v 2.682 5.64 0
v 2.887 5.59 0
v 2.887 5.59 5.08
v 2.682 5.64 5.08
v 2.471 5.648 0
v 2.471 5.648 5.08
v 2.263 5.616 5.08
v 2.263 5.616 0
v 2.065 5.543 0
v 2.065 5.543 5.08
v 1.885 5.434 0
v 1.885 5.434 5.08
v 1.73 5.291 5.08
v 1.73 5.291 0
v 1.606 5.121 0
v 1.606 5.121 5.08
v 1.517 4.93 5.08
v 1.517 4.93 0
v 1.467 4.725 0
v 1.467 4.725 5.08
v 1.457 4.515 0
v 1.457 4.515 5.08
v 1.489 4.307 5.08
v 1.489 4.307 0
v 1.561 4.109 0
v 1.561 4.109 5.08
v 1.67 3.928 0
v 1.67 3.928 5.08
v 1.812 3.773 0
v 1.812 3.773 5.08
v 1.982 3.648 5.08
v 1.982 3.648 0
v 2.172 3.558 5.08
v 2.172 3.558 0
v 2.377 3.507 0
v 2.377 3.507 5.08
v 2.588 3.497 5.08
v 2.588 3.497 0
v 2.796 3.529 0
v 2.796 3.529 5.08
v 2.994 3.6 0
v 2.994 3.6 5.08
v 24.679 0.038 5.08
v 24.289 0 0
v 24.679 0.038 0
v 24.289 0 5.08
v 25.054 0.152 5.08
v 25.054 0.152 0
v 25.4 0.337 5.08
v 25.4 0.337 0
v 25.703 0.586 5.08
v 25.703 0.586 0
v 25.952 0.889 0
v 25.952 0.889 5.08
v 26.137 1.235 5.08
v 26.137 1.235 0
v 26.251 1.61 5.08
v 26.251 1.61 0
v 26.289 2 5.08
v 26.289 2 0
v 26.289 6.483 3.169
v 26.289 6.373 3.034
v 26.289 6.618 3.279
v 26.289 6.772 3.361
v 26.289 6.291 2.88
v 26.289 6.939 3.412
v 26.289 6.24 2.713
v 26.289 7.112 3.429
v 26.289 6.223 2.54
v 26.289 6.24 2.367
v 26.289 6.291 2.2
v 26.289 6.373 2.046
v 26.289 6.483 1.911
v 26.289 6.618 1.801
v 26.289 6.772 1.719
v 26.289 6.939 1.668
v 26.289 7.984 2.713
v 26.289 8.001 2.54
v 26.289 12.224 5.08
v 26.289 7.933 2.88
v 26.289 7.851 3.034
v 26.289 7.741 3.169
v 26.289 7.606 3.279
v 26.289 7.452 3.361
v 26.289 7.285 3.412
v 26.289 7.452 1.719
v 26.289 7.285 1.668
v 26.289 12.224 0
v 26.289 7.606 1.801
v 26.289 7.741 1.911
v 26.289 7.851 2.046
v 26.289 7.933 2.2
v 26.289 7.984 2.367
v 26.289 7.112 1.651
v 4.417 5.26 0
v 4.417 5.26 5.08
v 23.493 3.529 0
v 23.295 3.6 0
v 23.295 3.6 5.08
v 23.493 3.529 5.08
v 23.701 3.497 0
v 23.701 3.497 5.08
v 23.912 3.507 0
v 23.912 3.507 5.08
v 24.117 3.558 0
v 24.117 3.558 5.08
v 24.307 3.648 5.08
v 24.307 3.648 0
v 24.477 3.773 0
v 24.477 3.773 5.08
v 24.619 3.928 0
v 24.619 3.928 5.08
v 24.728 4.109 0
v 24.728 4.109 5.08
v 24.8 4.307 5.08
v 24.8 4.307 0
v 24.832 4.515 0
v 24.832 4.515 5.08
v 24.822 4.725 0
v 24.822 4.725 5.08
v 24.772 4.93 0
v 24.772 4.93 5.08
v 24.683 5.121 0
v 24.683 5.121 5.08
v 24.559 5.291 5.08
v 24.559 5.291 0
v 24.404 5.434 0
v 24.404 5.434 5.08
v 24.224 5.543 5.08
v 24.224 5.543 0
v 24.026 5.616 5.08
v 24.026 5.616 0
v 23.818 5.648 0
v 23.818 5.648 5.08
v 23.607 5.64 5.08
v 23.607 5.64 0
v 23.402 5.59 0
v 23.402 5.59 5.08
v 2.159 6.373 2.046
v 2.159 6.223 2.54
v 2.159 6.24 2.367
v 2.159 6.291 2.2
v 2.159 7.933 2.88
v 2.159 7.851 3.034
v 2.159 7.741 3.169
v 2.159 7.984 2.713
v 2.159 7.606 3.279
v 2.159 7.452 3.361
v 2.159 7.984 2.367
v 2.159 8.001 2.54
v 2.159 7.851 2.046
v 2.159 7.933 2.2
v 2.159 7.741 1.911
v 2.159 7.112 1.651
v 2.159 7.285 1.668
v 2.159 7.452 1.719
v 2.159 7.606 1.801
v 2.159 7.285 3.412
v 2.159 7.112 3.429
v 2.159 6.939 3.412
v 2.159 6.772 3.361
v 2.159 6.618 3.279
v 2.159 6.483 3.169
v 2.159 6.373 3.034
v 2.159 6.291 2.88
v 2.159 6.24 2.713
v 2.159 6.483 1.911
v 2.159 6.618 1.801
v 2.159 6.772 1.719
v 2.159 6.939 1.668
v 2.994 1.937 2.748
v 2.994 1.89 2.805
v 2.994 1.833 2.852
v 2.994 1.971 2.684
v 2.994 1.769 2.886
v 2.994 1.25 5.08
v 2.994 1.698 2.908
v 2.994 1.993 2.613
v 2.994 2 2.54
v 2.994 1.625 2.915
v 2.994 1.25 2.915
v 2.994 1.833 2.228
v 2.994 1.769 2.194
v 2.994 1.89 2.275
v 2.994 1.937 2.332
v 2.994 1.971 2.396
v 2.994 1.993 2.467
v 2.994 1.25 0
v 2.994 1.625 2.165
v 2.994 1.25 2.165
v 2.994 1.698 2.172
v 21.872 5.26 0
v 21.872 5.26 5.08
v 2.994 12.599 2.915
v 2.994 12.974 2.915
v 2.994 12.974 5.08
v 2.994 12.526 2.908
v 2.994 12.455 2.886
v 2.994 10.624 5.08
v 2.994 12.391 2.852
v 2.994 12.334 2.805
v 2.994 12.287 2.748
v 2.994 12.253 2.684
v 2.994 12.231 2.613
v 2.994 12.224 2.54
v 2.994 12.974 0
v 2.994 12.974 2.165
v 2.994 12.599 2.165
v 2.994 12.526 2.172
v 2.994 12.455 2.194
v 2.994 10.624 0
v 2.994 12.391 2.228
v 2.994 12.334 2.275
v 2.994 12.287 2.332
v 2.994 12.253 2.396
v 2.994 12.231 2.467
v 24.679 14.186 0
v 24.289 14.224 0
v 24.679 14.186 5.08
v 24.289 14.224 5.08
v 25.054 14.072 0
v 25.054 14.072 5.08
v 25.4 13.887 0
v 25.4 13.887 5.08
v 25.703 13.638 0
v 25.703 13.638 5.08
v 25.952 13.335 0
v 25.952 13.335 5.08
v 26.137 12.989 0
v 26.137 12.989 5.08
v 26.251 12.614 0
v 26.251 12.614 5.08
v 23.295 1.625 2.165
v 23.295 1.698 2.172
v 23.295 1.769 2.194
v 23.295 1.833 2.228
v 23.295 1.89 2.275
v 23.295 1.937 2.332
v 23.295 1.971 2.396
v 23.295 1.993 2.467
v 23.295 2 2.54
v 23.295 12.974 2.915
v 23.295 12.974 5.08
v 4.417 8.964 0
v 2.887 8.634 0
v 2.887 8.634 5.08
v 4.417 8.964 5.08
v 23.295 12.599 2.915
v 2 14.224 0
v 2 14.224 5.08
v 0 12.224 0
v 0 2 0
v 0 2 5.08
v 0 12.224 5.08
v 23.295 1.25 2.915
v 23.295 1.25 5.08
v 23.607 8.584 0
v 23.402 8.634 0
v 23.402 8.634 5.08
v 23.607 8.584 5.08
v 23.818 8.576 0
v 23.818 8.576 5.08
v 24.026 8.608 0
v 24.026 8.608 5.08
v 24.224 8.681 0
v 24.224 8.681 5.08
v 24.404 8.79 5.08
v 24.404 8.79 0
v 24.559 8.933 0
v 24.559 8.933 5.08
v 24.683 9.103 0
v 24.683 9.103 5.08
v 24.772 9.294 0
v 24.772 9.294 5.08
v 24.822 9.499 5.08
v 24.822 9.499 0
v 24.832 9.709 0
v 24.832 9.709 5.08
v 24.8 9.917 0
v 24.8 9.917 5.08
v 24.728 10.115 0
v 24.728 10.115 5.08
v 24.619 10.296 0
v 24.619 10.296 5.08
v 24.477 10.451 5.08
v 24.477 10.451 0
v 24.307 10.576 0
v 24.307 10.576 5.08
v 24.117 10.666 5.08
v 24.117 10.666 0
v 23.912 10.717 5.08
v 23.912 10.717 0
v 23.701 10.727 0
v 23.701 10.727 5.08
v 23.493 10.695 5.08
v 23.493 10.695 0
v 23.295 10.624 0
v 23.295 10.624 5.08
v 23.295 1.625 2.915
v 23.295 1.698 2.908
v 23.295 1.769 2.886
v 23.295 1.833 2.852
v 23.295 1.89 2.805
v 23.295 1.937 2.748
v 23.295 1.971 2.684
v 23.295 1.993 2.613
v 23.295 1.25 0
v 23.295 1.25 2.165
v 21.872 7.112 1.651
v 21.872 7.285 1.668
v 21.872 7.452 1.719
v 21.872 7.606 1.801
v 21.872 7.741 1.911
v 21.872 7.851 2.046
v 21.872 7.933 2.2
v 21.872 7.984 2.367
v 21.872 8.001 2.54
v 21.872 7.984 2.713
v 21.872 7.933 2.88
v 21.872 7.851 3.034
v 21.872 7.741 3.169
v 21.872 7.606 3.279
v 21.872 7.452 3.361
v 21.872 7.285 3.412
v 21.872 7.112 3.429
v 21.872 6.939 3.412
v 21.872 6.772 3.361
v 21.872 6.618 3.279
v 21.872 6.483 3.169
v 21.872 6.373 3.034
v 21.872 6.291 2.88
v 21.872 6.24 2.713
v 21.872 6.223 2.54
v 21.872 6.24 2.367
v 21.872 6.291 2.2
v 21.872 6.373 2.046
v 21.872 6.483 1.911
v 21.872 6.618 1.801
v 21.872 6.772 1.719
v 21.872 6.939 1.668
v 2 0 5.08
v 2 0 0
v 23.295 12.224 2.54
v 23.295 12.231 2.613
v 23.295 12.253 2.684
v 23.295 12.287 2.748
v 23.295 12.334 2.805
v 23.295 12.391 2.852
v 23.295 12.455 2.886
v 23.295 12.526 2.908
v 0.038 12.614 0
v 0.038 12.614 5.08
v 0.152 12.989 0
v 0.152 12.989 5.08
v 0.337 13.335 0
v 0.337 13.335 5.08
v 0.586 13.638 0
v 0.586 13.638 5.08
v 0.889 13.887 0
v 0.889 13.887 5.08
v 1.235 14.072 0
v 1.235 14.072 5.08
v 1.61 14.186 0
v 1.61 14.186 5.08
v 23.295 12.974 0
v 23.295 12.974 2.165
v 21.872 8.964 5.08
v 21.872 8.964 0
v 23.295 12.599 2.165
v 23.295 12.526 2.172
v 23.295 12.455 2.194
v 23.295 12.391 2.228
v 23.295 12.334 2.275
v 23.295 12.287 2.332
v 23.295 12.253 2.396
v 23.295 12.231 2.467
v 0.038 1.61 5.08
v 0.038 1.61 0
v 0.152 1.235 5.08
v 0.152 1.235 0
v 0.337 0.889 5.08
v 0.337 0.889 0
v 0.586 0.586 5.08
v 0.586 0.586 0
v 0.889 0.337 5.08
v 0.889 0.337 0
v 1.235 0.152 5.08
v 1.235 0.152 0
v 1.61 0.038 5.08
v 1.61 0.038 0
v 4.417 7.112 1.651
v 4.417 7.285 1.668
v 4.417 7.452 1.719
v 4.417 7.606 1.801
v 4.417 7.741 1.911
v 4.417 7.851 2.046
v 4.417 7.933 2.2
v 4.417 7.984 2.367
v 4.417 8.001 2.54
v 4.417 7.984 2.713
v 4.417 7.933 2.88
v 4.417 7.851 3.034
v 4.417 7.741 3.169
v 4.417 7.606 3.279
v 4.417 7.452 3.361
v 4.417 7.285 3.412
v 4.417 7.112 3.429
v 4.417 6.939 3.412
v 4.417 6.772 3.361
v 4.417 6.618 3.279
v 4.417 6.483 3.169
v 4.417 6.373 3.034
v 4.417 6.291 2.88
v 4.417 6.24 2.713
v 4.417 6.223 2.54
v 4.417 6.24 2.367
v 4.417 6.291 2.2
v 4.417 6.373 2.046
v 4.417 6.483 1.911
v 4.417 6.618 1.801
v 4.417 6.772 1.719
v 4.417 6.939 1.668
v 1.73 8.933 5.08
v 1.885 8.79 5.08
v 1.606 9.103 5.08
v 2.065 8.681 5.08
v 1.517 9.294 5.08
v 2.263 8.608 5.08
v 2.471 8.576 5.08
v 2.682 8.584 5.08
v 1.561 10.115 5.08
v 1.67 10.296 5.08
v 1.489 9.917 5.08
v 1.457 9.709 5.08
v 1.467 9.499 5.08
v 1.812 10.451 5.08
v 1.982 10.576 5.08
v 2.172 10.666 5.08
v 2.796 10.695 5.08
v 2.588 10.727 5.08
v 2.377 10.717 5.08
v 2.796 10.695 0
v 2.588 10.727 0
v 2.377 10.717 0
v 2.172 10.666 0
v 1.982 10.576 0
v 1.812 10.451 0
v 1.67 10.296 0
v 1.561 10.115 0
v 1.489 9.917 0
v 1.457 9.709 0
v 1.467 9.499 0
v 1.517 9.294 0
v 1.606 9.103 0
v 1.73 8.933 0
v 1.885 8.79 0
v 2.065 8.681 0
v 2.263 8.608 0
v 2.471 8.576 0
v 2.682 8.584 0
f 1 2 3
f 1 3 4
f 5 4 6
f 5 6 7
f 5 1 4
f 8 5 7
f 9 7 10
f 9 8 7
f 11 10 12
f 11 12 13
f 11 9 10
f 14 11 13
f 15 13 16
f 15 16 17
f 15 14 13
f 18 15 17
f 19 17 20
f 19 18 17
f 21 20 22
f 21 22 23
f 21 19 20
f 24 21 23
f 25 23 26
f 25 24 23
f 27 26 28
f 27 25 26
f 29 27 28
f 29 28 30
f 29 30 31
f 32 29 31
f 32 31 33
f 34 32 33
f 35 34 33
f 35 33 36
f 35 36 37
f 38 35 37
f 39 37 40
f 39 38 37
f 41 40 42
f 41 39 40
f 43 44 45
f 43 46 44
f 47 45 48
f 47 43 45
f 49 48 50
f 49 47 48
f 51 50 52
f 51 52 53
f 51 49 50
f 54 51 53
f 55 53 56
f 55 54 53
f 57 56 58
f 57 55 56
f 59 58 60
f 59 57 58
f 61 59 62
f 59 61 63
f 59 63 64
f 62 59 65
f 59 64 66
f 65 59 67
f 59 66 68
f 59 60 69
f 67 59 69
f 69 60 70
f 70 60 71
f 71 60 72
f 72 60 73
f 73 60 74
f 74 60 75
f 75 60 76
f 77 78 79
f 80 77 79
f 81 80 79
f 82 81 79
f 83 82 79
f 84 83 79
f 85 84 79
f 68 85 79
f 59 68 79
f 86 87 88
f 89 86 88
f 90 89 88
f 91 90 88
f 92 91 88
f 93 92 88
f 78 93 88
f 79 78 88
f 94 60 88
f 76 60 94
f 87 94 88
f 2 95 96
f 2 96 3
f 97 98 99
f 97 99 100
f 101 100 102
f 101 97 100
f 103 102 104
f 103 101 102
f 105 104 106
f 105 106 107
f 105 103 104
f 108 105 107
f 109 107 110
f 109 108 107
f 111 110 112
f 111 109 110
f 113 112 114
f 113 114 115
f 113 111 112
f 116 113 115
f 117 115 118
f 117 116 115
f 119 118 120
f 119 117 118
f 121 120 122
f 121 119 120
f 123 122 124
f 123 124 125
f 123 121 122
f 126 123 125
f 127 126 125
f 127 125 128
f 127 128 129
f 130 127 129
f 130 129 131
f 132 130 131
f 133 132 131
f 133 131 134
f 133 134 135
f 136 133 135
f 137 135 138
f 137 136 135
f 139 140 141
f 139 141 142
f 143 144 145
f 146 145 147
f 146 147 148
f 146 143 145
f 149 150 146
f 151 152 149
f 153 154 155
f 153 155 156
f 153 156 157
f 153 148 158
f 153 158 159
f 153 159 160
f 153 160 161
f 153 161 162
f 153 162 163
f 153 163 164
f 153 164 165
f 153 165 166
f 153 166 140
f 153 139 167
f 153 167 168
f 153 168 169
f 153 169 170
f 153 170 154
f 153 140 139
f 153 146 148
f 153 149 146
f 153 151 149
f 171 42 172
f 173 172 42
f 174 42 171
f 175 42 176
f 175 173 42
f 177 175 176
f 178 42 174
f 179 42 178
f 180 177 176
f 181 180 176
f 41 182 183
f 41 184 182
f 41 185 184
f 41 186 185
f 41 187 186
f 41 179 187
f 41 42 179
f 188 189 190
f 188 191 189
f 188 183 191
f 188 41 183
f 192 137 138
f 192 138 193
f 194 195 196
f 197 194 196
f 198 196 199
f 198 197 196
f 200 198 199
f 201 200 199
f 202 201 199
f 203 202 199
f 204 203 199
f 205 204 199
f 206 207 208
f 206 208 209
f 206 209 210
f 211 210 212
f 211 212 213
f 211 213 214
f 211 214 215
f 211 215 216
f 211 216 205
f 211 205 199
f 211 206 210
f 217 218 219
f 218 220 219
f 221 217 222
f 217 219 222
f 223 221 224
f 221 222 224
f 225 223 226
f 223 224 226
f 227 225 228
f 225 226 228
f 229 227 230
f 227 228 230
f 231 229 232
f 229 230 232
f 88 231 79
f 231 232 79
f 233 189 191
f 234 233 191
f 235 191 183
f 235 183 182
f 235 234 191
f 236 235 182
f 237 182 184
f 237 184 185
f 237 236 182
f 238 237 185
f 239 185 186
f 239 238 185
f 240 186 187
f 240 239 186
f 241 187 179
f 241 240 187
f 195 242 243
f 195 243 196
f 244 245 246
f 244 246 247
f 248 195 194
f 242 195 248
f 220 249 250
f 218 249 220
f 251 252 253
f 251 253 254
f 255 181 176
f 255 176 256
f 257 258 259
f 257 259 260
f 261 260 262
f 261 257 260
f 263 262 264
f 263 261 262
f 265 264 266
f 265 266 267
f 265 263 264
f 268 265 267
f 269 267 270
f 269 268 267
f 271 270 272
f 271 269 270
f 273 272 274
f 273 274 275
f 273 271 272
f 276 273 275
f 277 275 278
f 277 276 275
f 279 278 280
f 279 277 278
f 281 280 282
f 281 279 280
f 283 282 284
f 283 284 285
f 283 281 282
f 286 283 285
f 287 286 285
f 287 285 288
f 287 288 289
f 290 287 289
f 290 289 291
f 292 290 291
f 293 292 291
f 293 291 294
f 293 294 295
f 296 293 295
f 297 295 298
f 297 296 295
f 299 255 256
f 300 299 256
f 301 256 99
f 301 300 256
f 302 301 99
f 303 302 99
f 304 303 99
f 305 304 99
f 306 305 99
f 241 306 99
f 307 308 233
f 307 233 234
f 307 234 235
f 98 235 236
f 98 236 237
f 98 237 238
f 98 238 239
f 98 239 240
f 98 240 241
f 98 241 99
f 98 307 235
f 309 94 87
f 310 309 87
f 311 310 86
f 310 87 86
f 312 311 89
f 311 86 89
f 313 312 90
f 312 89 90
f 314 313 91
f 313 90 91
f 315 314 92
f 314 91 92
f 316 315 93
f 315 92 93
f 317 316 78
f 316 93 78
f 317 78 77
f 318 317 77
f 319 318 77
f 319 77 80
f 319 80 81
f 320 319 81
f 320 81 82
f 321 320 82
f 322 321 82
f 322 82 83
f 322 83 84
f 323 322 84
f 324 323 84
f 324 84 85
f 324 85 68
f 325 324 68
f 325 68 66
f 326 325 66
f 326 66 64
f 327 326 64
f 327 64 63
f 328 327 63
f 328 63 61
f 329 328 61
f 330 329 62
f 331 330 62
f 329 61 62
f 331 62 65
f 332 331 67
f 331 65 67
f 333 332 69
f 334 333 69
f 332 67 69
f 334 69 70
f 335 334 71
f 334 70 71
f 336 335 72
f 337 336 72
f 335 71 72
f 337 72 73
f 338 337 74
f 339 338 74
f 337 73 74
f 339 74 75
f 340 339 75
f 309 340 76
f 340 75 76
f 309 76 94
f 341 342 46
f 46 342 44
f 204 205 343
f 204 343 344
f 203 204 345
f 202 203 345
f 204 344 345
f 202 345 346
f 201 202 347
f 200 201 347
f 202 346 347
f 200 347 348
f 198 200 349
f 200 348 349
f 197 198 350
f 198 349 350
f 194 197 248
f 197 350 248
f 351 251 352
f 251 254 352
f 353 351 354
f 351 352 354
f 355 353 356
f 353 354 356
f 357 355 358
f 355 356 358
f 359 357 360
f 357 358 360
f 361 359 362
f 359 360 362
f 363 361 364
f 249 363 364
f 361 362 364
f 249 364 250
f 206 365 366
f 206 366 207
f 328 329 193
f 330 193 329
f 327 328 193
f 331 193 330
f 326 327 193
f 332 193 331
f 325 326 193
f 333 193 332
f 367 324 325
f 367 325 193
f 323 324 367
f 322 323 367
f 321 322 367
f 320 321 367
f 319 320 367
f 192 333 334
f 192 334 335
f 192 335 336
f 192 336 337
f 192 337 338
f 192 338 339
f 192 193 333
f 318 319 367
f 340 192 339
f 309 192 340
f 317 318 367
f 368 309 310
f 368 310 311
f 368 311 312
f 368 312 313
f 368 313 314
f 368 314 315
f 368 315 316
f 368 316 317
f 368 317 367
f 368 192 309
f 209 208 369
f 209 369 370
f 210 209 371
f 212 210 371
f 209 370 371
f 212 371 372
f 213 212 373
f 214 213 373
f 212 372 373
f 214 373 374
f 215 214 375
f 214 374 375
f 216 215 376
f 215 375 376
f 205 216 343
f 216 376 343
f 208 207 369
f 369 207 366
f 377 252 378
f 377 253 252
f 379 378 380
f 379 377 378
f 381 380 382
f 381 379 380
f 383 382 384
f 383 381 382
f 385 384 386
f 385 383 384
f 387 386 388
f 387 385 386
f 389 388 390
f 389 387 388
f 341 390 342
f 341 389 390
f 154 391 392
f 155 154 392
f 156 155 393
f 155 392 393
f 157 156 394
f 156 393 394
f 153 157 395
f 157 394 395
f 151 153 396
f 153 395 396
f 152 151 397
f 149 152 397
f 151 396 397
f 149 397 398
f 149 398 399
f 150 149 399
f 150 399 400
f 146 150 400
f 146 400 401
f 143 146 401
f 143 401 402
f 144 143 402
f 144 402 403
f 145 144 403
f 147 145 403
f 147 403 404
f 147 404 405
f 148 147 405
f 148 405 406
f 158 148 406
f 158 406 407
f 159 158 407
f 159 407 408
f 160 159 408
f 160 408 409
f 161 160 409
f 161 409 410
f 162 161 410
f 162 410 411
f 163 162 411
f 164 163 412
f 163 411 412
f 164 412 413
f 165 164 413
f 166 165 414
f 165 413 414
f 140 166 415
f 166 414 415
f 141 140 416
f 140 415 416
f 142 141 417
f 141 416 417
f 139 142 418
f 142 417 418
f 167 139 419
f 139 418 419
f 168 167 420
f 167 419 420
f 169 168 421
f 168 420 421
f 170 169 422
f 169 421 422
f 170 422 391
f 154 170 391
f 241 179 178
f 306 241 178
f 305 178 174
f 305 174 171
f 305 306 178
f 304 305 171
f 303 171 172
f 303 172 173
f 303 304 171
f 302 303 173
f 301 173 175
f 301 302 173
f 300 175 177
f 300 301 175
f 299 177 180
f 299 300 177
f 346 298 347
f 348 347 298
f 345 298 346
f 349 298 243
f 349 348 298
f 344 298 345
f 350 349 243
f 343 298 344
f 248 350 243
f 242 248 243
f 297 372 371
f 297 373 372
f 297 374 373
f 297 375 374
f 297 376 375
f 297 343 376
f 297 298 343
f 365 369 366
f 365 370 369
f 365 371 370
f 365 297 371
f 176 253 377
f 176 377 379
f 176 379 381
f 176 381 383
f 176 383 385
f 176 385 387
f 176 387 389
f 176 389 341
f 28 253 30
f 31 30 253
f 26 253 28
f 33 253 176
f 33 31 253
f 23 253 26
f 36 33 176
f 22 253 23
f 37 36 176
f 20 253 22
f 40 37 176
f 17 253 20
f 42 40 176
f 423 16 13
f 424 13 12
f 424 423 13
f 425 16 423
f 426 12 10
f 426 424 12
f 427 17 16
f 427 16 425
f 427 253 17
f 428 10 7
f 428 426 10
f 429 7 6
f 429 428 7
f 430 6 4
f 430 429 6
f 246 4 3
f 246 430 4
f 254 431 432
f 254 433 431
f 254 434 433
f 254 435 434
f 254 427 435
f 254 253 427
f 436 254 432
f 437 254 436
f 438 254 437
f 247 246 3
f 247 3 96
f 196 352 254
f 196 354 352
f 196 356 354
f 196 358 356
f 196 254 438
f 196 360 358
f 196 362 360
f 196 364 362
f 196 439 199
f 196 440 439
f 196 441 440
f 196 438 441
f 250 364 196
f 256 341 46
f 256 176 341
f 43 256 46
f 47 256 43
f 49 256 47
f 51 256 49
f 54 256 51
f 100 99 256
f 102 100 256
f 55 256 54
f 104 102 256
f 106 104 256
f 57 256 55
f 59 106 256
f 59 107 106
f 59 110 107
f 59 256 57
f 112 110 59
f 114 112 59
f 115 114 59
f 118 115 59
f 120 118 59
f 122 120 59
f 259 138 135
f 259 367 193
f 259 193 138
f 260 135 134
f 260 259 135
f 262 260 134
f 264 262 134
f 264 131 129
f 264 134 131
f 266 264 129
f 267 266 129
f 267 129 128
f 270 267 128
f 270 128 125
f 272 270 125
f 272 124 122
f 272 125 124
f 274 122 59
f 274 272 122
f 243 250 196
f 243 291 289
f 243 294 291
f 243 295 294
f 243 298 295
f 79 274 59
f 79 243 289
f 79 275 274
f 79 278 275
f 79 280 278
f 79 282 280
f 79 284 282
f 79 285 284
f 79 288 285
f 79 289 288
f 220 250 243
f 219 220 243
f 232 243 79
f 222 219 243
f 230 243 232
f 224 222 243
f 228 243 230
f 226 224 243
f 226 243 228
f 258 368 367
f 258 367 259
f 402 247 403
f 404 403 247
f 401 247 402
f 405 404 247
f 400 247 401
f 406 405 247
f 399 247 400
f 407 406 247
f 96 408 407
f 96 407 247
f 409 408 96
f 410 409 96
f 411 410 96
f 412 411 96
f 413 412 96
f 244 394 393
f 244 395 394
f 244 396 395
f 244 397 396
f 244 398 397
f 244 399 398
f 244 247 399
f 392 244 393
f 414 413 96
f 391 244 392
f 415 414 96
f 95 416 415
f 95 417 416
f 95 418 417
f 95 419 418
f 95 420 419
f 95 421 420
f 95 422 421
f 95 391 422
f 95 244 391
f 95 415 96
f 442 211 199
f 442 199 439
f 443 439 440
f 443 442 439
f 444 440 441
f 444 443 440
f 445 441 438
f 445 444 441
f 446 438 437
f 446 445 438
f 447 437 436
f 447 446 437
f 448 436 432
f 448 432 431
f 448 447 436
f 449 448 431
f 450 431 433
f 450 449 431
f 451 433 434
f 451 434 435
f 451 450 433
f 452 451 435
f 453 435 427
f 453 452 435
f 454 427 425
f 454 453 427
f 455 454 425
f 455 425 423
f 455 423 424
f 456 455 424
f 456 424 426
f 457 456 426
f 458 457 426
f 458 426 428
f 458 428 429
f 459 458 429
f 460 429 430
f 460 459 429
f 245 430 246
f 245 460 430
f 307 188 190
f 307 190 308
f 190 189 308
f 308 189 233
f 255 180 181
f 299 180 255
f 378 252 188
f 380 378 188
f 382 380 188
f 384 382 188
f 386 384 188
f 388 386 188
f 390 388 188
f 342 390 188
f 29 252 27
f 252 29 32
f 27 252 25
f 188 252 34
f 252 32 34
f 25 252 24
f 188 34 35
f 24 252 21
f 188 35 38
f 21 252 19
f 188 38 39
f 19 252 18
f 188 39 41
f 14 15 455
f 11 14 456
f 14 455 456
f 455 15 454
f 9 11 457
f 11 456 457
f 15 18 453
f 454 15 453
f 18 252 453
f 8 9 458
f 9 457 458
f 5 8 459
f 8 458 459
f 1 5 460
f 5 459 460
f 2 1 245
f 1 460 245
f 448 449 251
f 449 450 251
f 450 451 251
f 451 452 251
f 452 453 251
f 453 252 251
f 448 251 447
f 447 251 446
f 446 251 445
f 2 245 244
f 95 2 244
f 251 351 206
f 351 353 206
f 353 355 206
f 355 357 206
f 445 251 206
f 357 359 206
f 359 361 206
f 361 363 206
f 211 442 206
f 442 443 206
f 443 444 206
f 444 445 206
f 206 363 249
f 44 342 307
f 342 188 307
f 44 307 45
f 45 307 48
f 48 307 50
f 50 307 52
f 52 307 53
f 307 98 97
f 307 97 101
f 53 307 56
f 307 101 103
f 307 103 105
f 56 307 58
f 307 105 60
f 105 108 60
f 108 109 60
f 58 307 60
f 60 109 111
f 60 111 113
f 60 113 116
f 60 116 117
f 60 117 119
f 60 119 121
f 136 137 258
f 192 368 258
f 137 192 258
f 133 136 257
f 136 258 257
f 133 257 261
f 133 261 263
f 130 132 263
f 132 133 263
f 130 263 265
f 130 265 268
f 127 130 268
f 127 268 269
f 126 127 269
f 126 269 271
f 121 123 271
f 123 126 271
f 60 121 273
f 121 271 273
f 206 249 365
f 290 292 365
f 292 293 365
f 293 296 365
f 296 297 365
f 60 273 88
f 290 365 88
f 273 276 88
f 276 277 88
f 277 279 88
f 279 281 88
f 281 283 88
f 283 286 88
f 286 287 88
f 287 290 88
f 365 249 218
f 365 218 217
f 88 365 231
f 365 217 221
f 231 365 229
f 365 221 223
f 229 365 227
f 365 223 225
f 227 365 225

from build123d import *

# Parameters (mm, degrees)
SKETCH1_W                = 26.289
SKETCH1_H                = 14.224
BOSS_EXTRUDE1_DEPTH      = 5.08
BOSS_EXTRUDE2_DEPTH      = 0.375
BOSS_EXTRUDE2_DEPTH_BACK = 0.375
SKETCH2_W                = 20.300617312
SKETCH2_H                = 0.75
FILLET1_R                = 0.375
FILLET2_R                = 2
SKETCH3_R                = 0.889
CUT_EXTRUDE1_DEPTH       = 24.13


with BuildPart() as part:
    # Sketch1 → Boss-Extrude1 (new body)
    with BuildSketch(Plane.XY):
        with Locations((13.1445, 7.112)):
            Rectangle(SKETCH1_W, SKETCH1_H)
        with BuildLine():
            ThreePointArc((2.994191344, 10.624), (1.457238853, 9.709108648), (2.886694423, 8.633977996))
            Line((2.886694423, 8.633977996), (4.417480803, 8.964165012))
            Line((4.417480803, 8.964165012), (4.417480803, 5.259834988))
            Line((4.417480803, 5.259834988), (2.886694423, 5.590022004))
            ThreePointArc((2.886694423, 5.590022004), (1.457238853, 4.514891352), (2.994191344, 3.6))
            Line((2.994191344, 3.6), (2.994191344, 1.25))
            Line((2.994191344, 1.25), (23.294808656, 1.25))
            Line((23.294808656, 1.25), (23.294808656, 3.6))
            ThreePointArc((23.294808656, 3.6), (24.831761147, 4.514891352), (23.402305577, 5.590022004))
            Line((23.402305577, 5.590022004), (21.871519197, 5.259834988))
            Line((21.871519197, 5.259834988), (21.871519197, 8.964165012))
            Line((21.871519197, 8.964165012), (23.402305577, 8.633977996))
            ThreePointArc((23.402305577, 8.633977996), (24.831761147, 9.709108648), (23.294808656, 10.624))
            Line((23.294808656, 10.624), (23.294808656, 12.974))
            Line((23.294808656, 12.974), (2.994191344, 12.974))
            Line((2.994191344, 12.974), (2.994191344, 10.624))
        make_face(mode=Mode.SUBTRACT)
    extrude(amount=BOSS_EXTRUDE1_DEPTH)

    # Sketch2 → Boss-Extrude2 (add, two sides: drawn at the far end of the back side and taken through both)
    with BuildSketch(Plane.XY.offset(2.54).offset(-BOSS_EXTRUDE2_DEPTH_BACK)):
        with Locations((13.1445, 1.625)):
            Rectangle(SKETCH2_W, SKETCH2_H)
        with Locations((13.1445, 12.599)):
            Rectangle(SKETCH2_W, SKETCH2_H)
    extrude(amount=BOSS_EXTRUDE2_DEPTH + BOSS_EXTRUDE2_DEPTH_BACK)

    # Fillet1
    fillet1_edges = [part.edges().sort_by_distance(p)[0] for p in [
        (13.1445, 12.224, 2.165),
        (13.1445, 12.224, 2.915),
        (13.1445, 2, 2.165),
        (13.1445, 2, 2.915),
    ]]
    fillet(fillet1_edges, radius=FILLET1_R - 0.0001)  # a hair under: the kernel refuses the full size

    # Fillet2
    fillet2_edges = [part.edges().sort_by_distance(p)[0] for p in [
        (0, 0, 2.54),
        (0, 14.224, 2.54),
        (26.289, 14.224, 2.54),
        (26.289, 0, 2.54),
    ]]
    fillet(fillet2_edges, radius=FILLET2_R)

    # Sketch3 → Cut-Extrude1 (cut)
    with BuildSketch(Plane(origin=(26.289, 0, 0), x_dir=(0, 0, -1), z_dir=(1, 0, 0))):
        with Locations((-2.54, 7.112)):
            Circle(SKETCH3_R)
    extrude(amount=-CUT_EXTRUDE1_DEPTH, mode=Mode.SUBTRACT)


solid = part.part
